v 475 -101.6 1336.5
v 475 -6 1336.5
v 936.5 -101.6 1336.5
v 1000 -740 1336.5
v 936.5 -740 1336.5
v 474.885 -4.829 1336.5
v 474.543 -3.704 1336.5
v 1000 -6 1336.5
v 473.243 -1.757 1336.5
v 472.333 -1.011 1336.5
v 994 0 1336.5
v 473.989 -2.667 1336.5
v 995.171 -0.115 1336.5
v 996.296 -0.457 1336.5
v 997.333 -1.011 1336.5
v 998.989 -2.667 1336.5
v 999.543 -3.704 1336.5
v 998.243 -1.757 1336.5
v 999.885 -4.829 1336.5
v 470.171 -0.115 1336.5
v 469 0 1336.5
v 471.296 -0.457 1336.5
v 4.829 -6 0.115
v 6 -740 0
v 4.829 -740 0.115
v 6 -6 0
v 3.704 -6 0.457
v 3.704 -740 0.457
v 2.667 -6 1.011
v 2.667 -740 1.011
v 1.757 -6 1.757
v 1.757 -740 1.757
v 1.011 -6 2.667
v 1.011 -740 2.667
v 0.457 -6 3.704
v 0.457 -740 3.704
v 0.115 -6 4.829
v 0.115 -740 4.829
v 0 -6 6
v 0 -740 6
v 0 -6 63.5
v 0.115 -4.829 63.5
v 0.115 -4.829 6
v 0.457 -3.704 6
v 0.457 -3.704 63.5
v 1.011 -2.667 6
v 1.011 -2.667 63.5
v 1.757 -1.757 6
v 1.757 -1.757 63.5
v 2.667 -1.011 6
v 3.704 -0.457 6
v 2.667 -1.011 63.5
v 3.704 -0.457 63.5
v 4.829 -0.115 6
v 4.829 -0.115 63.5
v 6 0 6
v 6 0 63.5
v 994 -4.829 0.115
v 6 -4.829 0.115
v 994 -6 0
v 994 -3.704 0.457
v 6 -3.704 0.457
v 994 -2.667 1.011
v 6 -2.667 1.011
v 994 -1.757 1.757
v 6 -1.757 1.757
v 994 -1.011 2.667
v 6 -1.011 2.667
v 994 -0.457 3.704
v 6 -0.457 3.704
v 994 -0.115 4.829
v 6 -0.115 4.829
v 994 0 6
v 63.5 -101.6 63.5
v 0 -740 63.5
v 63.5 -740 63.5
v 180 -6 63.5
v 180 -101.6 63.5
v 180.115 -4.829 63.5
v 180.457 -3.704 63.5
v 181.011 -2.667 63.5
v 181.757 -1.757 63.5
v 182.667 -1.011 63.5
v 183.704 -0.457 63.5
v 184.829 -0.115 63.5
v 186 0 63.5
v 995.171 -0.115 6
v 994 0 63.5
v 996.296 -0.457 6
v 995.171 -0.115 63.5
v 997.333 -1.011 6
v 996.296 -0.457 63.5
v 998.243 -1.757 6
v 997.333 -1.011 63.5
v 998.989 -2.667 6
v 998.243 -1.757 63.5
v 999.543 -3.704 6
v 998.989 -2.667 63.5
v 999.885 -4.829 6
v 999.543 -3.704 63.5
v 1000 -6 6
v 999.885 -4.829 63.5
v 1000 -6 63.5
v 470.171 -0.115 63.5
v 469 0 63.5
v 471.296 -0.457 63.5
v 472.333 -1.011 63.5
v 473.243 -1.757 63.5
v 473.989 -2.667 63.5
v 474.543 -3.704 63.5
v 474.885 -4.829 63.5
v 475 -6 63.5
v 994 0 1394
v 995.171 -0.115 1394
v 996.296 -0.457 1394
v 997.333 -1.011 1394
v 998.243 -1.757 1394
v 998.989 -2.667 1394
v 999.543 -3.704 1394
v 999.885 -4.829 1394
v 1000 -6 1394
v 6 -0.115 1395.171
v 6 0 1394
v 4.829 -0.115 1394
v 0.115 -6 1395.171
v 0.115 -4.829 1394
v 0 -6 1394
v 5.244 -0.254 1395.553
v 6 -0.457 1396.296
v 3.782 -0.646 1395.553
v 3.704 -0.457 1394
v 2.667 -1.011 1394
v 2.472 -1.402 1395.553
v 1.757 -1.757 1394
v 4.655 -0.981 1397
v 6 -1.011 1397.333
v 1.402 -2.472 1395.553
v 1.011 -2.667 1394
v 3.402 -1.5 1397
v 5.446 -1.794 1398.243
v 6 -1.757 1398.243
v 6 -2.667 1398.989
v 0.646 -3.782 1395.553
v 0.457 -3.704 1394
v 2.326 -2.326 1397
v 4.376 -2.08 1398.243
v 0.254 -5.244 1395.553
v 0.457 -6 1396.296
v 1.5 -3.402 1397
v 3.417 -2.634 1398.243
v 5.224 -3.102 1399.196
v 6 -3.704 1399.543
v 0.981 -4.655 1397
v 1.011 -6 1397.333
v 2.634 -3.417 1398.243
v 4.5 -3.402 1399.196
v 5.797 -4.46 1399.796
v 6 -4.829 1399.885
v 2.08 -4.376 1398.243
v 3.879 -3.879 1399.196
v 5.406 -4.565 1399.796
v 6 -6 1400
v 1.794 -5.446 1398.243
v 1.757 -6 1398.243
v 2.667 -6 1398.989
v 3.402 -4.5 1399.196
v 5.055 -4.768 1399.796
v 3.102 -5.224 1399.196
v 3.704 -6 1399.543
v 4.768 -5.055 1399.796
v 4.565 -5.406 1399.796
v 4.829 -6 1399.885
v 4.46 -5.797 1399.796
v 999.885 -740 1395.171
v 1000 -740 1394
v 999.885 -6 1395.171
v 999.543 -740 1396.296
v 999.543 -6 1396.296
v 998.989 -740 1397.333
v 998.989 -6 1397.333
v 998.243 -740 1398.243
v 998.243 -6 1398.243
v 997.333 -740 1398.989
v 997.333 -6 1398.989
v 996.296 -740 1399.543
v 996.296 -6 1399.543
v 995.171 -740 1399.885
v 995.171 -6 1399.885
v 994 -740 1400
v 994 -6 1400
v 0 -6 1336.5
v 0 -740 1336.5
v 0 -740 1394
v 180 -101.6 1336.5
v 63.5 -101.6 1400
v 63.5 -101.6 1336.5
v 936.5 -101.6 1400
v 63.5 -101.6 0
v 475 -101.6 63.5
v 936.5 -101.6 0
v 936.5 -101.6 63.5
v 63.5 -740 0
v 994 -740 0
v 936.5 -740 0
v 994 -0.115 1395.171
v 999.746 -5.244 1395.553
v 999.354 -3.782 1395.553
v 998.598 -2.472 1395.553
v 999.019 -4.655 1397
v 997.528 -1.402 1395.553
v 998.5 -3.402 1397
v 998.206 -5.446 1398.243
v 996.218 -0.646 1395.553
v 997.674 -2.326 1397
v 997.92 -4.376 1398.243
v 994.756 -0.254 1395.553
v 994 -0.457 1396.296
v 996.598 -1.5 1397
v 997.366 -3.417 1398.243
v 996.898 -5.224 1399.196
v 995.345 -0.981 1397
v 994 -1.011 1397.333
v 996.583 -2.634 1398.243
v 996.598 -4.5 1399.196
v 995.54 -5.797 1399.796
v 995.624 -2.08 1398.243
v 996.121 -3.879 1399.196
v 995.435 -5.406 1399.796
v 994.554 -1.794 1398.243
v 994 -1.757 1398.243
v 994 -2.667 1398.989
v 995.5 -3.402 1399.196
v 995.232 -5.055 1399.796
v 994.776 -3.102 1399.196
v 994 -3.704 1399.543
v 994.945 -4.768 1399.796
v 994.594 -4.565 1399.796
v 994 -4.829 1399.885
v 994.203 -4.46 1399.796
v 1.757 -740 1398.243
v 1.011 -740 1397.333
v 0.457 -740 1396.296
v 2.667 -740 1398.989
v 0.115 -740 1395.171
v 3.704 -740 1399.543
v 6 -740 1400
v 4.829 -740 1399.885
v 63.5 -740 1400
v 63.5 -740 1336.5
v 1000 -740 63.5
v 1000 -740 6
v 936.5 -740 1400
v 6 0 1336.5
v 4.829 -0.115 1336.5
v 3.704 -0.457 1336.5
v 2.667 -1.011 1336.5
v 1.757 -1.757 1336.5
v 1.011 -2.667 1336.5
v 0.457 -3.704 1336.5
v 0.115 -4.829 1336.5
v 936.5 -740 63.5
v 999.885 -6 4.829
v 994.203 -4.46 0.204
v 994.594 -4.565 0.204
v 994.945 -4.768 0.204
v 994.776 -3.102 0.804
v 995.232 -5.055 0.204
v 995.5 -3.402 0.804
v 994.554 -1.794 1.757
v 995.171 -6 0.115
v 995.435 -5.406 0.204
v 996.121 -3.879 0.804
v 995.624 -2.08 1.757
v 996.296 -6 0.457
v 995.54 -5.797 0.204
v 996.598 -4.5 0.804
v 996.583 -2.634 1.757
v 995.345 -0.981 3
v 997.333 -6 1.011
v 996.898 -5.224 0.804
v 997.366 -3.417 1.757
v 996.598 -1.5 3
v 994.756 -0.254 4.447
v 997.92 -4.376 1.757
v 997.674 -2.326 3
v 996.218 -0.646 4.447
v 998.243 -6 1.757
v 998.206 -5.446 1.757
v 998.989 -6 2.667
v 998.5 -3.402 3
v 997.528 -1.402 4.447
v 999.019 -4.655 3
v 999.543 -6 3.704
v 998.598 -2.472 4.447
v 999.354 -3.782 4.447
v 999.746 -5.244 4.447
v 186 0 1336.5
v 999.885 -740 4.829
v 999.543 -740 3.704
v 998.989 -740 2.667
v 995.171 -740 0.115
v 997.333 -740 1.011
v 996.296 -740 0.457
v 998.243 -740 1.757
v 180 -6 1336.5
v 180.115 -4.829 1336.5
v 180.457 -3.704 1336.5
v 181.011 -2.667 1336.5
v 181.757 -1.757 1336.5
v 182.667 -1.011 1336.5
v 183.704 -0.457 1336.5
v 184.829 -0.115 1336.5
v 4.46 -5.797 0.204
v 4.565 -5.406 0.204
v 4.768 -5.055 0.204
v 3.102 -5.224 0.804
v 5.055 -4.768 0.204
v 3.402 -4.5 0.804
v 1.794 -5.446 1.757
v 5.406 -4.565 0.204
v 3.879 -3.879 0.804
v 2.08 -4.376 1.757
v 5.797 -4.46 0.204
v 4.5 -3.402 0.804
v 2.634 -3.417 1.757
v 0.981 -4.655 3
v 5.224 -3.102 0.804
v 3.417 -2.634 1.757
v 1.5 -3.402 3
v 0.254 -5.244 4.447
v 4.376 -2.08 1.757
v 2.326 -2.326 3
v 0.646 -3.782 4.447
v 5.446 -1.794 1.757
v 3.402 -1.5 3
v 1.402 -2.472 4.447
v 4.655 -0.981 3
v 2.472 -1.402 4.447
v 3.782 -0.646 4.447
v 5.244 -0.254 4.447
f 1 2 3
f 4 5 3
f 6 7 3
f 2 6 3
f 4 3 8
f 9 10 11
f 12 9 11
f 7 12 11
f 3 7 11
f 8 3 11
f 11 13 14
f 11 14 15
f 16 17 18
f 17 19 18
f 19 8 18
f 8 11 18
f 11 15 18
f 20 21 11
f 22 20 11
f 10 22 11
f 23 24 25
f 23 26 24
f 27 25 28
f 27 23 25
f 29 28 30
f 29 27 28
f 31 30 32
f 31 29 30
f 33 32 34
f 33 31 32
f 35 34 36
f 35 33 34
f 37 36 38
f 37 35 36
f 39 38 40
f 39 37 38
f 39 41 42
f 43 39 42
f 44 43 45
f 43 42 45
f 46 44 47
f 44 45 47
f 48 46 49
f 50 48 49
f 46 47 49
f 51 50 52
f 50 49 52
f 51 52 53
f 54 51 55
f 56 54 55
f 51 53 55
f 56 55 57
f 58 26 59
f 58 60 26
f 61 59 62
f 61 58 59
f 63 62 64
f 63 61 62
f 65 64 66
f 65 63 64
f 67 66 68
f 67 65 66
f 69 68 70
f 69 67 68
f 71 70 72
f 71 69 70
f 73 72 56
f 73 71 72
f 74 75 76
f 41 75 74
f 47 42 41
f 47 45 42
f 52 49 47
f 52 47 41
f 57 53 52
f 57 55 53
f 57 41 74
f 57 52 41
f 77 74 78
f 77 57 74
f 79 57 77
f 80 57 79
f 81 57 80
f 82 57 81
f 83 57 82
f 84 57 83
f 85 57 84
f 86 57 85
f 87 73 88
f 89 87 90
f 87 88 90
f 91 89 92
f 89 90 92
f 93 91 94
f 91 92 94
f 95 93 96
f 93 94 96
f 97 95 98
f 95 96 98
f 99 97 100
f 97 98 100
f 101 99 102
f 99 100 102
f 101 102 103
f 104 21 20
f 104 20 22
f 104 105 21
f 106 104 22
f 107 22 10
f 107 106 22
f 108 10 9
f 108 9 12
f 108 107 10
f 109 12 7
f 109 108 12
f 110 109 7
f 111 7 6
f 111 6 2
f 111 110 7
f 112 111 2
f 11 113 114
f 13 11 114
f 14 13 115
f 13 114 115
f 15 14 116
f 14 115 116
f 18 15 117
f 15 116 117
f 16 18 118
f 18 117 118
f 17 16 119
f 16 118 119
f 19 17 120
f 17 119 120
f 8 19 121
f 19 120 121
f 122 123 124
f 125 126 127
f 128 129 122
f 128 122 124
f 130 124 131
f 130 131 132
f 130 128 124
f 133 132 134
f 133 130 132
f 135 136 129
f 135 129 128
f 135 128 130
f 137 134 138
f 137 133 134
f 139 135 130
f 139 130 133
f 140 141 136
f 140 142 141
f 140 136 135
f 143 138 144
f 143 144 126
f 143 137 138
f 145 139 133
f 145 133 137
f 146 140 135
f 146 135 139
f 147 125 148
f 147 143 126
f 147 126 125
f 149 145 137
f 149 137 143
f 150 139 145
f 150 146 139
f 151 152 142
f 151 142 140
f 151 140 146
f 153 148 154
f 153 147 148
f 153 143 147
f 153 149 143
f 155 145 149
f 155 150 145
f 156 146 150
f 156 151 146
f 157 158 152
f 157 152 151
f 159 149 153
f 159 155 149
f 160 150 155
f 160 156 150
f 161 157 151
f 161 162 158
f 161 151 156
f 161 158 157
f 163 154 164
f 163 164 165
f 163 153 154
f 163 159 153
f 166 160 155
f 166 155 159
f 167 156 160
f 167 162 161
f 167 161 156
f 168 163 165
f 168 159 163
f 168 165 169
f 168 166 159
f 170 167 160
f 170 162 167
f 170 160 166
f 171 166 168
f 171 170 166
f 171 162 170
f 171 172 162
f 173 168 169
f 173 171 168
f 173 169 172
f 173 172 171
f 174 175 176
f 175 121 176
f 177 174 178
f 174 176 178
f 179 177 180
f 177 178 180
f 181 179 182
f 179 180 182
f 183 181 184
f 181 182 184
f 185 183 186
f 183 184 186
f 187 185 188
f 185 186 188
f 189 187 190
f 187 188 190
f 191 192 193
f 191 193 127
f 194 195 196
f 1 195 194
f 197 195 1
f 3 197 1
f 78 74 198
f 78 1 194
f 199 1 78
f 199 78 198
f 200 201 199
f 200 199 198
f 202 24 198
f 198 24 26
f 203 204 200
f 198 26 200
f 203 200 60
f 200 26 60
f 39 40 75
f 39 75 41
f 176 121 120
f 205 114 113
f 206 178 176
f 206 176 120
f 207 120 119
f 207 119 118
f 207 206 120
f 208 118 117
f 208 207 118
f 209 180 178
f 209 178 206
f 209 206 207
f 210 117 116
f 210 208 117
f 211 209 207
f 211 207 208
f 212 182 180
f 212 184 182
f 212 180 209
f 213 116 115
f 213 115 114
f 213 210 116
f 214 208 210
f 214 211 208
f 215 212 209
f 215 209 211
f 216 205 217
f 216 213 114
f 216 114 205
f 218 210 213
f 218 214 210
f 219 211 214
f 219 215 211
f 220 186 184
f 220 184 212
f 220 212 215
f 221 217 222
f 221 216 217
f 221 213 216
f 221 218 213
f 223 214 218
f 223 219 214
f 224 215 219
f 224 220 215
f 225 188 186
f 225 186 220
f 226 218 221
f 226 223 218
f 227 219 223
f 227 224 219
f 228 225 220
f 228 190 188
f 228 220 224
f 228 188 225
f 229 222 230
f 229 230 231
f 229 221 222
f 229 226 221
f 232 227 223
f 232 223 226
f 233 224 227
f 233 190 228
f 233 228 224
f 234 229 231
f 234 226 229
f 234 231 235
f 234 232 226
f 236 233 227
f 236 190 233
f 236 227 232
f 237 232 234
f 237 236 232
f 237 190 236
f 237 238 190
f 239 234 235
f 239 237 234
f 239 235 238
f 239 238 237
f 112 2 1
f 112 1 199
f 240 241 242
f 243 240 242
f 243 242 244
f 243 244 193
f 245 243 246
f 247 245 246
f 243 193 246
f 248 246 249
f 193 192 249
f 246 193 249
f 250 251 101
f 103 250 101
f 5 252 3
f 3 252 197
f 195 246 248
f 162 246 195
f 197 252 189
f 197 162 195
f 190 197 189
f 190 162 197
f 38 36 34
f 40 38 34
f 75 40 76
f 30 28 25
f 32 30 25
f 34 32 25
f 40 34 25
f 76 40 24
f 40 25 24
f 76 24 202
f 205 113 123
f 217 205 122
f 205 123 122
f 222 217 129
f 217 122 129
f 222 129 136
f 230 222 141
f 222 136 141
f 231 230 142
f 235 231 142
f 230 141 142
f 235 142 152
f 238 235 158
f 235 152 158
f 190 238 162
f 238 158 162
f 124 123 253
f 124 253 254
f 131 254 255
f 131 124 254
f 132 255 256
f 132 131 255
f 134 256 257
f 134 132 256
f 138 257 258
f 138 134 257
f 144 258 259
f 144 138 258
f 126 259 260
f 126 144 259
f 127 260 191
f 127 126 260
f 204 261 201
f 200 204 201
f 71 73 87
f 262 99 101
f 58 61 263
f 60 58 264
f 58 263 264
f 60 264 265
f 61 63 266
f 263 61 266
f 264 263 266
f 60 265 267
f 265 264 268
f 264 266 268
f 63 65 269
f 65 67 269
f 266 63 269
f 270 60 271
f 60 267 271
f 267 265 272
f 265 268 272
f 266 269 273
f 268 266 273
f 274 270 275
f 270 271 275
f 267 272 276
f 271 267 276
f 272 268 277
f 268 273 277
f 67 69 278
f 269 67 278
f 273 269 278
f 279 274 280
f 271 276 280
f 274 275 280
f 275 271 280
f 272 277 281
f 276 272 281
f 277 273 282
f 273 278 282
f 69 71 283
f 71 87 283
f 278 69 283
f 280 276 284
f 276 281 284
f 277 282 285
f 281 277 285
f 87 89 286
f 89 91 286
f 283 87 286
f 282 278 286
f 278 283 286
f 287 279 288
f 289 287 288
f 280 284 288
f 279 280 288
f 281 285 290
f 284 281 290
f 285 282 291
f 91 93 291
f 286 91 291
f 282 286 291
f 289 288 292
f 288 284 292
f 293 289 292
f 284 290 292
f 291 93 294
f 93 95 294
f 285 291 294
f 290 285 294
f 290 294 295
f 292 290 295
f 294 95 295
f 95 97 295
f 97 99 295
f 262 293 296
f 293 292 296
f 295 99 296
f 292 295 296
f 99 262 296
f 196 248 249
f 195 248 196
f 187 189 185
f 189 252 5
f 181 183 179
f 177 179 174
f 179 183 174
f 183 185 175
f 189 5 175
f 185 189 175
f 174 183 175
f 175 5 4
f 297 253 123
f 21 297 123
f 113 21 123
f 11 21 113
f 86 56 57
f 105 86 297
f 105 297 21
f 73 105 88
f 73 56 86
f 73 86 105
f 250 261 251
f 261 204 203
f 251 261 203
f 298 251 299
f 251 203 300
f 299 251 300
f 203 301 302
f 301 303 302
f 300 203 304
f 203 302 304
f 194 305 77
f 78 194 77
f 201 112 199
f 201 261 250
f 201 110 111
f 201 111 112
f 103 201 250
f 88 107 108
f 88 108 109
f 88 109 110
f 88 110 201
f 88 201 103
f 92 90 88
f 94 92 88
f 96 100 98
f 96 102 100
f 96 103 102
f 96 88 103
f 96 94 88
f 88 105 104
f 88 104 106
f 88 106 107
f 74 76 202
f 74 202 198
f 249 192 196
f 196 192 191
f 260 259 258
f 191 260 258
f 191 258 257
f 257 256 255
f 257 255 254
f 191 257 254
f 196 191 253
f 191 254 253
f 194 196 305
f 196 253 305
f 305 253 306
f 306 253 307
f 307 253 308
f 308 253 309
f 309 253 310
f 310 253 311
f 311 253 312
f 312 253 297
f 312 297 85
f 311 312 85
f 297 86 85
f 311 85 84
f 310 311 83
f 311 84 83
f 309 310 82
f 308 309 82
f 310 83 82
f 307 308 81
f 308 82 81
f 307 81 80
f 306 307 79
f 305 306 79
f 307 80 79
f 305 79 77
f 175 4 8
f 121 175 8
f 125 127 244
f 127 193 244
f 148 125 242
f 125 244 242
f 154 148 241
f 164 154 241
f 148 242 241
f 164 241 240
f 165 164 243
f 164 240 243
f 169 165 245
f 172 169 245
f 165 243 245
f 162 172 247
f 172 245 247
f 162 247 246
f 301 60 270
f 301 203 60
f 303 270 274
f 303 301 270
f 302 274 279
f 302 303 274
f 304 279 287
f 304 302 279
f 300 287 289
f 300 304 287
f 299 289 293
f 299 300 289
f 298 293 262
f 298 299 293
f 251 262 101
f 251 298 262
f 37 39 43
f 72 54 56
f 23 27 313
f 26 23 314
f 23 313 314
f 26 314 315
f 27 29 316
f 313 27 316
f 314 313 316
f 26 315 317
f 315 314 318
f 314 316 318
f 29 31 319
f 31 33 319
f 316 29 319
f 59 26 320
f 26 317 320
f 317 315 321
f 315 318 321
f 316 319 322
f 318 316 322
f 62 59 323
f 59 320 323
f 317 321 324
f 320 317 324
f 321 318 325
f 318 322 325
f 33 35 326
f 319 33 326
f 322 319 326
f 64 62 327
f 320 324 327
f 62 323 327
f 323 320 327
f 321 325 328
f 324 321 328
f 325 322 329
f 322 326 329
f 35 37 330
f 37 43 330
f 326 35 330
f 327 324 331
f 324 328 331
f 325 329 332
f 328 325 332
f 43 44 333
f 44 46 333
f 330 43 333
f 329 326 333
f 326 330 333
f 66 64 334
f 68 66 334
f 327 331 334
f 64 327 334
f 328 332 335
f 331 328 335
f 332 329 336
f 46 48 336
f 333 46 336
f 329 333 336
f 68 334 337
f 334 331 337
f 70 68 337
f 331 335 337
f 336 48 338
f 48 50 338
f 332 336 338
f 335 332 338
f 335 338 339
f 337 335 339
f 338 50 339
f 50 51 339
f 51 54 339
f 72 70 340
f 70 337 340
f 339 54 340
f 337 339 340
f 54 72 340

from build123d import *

# Parameters (mm, degrees)
CROQUIS1_W              = 1000
CROQUIS1_H              = 740
SALIENTE_EXTRUIR1_DEPTH = 1400
CROQUIS2_W              = 873
CROQUIS2_H              = 638.4
CORTAR_EXTRUIR1_DEPTH   = 1400
CROQUIS3_W              = 1273
CROQUIS3_H              = 638.4
CORTAR_EXTRUIR2_DEPTH   = 1000
CROQUIS4_W              = 180
CROQUIS4_H              = 1273
CROQUIS4_W_2            = 525
CORTAR_EXTRUIR3_DEPTH   = 200
REDONDEO1_R             = 6
REDONDEO2_R             = 6
REDONDEO4_R             = 6


with BuildPart() as part:
    # Croquis1 → Saliente-Extruir1 (new body)
    with BuildSketch(Plane.XY):
        with Locations((500, -370)):
            Rectangle(CROQUIS1_W, CROQUIS1_H)
    extrude(amount=SALIENTE_EXTRUIR1_DEPTH)

    # Croquis2 → Cortar-Extruir1 (cut)
    with BuildSketch(Plane.XY.offset(1400)):
        with Locations((500, -420.8)):
            Rectangle(CROQUIS2_W, CROQUIS2_H)
    extrude(amount=-CORTAR_EXTRUIR1_DEPTH, mode=Mode.SUBTRACT)

    # Croquis3 → Cortar-Extruir2 (cut)
    with BuildSketch(Plane(origin=(1000, 0, 0), x_dir=(0, 0, -1), z_dir=(1, 0, 0))):
        with Locations((-700, -420.8)):
            Rectangle(CROQUIS3_W, CROQUIS3_H)
    extrude(amount=-CORTAR_EXTRUIR2_DEPTH, mode=Mode.SUBTRACT)

    # Croquis4 → Cortar-Extruir3 (cut)
    with BuildSketch(Plane(origin=(0, 0, 0), x_dir=(1, 0, 0), z_dir=(0, 1, 0))):
        with Locations((90, -700)):
            Rectangle(CROQUIS4_W, CROQUIS4_H)
        with Locations((737.5, -700)):
            Rectangle(CROQUIS4_W_2, CROQUIS4_H)
    extrude(amount=-CORTAR_EXTRUIR3_DEPTH, mode=Mode.SUBTRACT)

    # Redondeo1
    redondeo1_edges = [part.edges().sort_by_distance(p)[0] for p in [
        (0, 0, 31.75),
        (0, 0, 1368.25),
        (1000, 0, 1368.25),
        (1000, 0, 31.75),
    ]]
    fillet(redondeo1_edges, radius=REDONDEO1_R)

    # Redondeo2
    redondeo2_edges = [part.edges().sort_by_distance(p)[0] for p in [
        (180, 0, 700),
        (475, 0, 700),
    ]]
    fillet(redondeo2_edges, radius=REDONDEO2_R)

    # Redondeo4
    redondeo4_edges = [part.edges().sort_by_distance(p)[0] for p in [
        (1000, -373, 1400),
        (0, -373, 1400),
        (500, 0, 0),
        (500, 0, 1400),
        (998.242640687, -1.757359313, 1400),
        (1.757359313, -1.757359313, 1400),
        (0, -373, 0),
        (998.242640687, -1.757359313, 0),
        (1.757359313, -1.757359313, 0),
        (1000, -373, 0),
    ]]
    fillet(redondeo4_edges, radius=REDONDEO4_R)


solid = part.part
